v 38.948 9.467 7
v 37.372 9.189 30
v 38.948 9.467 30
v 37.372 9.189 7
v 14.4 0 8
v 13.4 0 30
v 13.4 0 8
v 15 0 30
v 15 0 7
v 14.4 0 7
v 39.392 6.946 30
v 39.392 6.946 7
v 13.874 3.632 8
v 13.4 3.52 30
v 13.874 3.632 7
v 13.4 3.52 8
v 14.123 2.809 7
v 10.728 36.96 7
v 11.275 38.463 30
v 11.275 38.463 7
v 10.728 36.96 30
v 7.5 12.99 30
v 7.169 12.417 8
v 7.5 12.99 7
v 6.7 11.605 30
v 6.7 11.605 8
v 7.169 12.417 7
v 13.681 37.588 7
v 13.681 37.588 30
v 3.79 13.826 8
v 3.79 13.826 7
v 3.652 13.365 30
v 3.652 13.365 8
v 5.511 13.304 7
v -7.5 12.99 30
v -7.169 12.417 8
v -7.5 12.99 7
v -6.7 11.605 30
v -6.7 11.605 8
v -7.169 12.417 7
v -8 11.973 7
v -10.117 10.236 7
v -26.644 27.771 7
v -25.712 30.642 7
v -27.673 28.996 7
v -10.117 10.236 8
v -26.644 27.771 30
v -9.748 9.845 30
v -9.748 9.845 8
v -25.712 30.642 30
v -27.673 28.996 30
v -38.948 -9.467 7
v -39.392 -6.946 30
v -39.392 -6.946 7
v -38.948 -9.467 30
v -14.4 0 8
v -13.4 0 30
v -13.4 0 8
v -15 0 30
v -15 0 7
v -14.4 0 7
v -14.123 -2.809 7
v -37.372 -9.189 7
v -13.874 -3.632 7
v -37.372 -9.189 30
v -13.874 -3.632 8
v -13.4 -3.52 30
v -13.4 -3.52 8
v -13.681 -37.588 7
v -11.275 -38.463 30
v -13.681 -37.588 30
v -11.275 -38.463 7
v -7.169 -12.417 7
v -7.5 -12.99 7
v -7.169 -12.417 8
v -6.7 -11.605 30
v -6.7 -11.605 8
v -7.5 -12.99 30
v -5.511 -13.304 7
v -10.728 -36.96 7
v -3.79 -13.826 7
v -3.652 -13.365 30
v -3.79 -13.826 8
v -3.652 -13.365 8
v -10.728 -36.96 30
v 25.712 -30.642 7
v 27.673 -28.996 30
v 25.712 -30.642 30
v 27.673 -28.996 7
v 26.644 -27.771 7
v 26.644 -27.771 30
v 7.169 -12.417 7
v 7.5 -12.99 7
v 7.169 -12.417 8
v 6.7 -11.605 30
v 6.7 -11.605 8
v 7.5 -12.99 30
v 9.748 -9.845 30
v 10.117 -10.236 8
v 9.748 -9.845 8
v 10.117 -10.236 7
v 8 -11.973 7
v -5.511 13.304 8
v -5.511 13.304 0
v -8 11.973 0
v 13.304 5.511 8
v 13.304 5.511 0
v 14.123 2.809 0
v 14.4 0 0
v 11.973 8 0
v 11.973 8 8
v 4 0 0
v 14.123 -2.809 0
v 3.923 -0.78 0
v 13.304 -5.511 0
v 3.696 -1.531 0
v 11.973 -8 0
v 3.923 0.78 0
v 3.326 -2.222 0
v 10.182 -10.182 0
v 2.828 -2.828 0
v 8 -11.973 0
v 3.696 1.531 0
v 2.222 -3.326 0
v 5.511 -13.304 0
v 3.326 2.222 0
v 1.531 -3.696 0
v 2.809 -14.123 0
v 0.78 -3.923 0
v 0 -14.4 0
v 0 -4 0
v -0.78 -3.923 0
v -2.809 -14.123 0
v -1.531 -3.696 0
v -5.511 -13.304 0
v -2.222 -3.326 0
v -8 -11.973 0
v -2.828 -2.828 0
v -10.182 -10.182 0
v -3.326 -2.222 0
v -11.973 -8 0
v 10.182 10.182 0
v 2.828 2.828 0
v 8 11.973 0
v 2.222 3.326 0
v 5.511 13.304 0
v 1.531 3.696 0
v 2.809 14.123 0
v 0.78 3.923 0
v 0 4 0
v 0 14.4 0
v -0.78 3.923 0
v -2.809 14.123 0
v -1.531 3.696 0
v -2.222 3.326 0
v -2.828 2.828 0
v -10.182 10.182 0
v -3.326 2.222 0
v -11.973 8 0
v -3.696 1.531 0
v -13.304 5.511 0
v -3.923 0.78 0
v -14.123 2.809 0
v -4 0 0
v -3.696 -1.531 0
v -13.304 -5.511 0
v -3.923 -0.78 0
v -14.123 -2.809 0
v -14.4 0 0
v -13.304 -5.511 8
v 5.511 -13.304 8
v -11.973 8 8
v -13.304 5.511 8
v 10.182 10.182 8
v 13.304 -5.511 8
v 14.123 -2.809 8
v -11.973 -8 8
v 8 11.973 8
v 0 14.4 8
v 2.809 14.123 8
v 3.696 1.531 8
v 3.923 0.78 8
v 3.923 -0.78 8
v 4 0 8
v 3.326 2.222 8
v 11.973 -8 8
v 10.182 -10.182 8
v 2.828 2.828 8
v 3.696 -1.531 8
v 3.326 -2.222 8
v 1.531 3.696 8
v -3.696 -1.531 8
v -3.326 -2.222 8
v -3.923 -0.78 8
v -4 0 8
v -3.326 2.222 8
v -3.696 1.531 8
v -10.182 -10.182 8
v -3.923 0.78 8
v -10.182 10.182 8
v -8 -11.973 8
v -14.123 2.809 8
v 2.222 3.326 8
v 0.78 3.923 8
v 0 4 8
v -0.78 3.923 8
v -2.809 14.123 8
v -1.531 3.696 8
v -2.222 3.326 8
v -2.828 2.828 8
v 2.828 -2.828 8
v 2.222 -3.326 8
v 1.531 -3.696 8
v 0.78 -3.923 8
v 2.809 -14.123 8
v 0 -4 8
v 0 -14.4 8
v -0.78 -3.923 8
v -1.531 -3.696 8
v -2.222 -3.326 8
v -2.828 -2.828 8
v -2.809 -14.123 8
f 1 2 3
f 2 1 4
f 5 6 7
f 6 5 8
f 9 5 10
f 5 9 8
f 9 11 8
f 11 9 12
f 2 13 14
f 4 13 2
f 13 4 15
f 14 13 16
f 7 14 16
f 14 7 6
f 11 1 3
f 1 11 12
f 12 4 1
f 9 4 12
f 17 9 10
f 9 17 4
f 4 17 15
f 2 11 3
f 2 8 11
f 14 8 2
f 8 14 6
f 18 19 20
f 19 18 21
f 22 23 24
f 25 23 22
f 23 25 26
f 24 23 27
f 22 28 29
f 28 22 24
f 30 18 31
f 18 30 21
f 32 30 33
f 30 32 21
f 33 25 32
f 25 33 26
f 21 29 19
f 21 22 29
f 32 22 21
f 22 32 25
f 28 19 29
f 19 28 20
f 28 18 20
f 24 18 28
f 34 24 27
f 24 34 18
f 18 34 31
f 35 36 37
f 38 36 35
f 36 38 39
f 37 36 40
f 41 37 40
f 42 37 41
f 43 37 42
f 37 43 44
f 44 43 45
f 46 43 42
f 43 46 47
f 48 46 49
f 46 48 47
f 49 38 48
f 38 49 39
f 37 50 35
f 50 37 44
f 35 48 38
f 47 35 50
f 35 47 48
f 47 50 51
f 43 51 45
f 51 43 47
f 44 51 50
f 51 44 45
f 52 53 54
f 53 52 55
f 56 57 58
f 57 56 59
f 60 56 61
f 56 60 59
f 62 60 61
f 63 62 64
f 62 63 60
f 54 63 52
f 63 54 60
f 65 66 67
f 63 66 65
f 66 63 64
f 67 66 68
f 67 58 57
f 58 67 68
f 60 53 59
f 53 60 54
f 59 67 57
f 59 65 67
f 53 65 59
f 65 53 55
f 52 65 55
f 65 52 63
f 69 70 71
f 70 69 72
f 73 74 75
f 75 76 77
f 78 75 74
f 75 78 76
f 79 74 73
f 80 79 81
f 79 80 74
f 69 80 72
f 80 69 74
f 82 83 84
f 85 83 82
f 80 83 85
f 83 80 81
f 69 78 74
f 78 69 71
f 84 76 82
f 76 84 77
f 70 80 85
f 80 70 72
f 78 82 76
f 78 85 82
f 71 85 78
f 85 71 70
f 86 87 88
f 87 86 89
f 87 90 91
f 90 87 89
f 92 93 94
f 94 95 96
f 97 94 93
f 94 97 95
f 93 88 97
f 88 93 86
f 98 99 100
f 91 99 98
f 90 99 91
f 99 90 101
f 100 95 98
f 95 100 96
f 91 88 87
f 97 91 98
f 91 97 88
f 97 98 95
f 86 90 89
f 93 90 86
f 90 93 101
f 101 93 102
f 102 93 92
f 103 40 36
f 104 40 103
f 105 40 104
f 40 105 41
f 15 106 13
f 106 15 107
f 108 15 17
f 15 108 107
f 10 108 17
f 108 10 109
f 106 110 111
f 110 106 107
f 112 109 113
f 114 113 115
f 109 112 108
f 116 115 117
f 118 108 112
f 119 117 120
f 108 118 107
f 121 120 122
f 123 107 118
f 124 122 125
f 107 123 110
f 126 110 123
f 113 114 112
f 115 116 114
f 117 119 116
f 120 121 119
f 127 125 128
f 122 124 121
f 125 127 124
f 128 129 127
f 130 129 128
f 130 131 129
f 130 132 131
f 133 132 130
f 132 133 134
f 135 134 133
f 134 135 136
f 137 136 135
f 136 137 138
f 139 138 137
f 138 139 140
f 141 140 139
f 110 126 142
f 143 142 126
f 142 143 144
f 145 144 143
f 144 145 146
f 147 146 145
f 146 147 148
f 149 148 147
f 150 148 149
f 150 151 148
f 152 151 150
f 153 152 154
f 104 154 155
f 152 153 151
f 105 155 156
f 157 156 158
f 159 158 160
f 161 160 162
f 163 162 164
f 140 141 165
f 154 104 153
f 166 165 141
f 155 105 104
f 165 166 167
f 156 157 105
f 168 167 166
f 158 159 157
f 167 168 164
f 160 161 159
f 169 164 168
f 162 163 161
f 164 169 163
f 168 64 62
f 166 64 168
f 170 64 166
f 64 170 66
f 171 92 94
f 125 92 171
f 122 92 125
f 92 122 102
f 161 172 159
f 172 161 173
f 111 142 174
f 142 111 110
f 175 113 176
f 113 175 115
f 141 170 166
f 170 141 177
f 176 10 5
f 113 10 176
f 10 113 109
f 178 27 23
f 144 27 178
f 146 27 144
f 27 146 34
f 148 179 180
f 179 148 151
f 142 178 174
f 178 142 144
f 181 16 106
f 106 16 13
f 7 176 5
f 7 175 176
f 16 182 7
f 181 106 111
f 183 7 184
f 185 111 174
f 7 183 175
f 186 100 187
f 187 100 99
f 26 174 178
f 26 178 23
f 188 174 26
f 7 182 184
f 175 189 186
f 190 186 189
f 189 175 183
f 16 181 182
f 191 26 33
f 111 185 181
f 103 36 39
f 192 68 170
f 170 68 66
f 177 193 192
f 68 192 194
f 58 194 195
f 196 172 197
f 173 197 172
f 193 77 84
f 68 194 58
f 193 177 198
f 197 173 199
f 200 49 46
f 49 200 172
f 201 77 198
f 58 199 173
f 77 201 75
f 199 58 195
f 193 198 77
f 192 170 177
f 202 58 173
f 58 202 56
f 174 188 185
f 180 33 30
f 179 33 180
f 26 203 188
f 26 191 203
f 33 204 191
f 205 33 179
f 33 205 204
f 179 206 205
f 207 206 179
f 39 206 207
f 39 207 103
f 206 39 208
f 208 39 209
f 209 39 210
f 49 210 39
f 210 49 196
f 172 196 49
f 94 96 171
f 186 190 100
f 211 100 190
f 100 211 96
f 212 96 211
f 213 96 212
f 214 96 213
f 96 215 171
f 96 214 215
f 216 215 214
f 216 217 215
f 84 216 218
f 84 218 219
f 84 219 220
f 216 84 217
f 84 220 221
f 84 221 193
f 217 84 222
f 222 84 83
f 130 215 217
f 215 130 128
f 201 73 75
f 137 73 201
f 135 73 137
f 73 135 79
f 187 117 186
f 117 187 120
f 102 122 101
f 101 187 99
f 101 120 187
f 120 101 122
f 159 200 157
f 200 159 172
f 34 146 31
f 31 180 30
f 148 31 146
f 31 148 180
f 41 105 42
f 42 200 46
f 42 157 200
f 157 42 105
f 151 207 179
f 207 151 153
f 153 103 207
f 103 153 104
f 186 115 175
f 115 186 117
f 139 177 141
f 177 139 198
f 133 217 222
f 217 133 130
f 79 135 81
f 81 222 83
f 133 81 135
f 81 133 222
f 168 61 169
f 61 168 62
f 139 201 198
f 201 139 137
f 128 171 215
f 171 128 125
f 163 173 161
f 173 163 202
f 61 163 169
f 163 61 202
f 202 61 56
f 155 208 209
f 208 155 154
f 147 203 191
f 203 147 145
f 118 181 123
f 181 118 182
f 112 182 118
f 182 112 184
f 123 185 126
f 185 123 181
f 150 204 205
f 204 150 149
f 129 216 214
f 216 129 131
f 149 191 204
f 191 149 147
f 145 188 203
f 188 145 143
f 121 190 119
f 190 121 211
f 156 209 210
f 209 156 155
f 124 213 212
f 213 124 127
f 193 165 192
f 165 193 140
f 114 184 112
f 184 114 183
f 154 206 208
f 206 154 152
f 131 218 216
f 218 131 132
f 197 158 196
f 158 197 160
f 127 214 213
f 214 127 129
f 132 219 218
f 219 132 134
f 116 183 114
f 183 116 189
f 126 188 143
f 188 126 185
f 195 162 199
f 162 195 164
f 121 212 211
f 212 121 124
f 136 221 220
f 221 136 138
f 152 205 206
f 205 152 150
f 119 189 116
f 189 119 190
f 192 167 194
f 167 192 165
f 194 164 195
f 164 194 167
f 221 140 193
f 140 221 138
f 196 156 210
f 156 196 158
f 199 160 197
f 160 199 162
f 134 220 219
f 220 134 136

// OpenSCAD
$fn = 32;

// ----------------------------------------------------------------------
// Impeller: 80 mm, 6 blades, 30 mm tall
// ----------------------------------------------------------------------

// --- parameters (mm) ---
center_d = 28.8;          // hub diameter
center_h = 8;             // hub height
wheel_d = 80;             // outer diameter over the blades
blade_count = 6;          // number of blades
blade_t = 1.6;            // blade thickness
blade_h = 22;             // blade height
blade_in_r = 13.4;        // blade root radius
blade_out_r = 38.4;       // blade tip radius
sweep = 10;               // blade sweep, degrees
bore_d = 8;               // shaft bore

module hub() {
  cylinder(h = center_h, d = center_d);
}

module blade() {
  /* blade swept between two boxes: hull of the root and the tip section */
  hull() {
    translate([blade_in_r, 0, center_h - 1])
      cube([blade_t, blade_t * 2.2, blade_h + 1], center = false);
    rotate([0, 0, sweep])
      translate([blade_out_r, 0, center_h - 1])
        cube([blade_t, blade_t * 1.6, blade_h + 1], center = false);
  }
}

module blades() {
  for (i = [0 : blade_count - 1])
    rotate([0, 0, i * 360 / blade_count]) blade();
}

difference() {
  union() {
    hub();
    blades();
  }
  translate([0, 0, -1]) cylinder(h = center_h + blade_h + 0 + 3, d = bore_d);
}
